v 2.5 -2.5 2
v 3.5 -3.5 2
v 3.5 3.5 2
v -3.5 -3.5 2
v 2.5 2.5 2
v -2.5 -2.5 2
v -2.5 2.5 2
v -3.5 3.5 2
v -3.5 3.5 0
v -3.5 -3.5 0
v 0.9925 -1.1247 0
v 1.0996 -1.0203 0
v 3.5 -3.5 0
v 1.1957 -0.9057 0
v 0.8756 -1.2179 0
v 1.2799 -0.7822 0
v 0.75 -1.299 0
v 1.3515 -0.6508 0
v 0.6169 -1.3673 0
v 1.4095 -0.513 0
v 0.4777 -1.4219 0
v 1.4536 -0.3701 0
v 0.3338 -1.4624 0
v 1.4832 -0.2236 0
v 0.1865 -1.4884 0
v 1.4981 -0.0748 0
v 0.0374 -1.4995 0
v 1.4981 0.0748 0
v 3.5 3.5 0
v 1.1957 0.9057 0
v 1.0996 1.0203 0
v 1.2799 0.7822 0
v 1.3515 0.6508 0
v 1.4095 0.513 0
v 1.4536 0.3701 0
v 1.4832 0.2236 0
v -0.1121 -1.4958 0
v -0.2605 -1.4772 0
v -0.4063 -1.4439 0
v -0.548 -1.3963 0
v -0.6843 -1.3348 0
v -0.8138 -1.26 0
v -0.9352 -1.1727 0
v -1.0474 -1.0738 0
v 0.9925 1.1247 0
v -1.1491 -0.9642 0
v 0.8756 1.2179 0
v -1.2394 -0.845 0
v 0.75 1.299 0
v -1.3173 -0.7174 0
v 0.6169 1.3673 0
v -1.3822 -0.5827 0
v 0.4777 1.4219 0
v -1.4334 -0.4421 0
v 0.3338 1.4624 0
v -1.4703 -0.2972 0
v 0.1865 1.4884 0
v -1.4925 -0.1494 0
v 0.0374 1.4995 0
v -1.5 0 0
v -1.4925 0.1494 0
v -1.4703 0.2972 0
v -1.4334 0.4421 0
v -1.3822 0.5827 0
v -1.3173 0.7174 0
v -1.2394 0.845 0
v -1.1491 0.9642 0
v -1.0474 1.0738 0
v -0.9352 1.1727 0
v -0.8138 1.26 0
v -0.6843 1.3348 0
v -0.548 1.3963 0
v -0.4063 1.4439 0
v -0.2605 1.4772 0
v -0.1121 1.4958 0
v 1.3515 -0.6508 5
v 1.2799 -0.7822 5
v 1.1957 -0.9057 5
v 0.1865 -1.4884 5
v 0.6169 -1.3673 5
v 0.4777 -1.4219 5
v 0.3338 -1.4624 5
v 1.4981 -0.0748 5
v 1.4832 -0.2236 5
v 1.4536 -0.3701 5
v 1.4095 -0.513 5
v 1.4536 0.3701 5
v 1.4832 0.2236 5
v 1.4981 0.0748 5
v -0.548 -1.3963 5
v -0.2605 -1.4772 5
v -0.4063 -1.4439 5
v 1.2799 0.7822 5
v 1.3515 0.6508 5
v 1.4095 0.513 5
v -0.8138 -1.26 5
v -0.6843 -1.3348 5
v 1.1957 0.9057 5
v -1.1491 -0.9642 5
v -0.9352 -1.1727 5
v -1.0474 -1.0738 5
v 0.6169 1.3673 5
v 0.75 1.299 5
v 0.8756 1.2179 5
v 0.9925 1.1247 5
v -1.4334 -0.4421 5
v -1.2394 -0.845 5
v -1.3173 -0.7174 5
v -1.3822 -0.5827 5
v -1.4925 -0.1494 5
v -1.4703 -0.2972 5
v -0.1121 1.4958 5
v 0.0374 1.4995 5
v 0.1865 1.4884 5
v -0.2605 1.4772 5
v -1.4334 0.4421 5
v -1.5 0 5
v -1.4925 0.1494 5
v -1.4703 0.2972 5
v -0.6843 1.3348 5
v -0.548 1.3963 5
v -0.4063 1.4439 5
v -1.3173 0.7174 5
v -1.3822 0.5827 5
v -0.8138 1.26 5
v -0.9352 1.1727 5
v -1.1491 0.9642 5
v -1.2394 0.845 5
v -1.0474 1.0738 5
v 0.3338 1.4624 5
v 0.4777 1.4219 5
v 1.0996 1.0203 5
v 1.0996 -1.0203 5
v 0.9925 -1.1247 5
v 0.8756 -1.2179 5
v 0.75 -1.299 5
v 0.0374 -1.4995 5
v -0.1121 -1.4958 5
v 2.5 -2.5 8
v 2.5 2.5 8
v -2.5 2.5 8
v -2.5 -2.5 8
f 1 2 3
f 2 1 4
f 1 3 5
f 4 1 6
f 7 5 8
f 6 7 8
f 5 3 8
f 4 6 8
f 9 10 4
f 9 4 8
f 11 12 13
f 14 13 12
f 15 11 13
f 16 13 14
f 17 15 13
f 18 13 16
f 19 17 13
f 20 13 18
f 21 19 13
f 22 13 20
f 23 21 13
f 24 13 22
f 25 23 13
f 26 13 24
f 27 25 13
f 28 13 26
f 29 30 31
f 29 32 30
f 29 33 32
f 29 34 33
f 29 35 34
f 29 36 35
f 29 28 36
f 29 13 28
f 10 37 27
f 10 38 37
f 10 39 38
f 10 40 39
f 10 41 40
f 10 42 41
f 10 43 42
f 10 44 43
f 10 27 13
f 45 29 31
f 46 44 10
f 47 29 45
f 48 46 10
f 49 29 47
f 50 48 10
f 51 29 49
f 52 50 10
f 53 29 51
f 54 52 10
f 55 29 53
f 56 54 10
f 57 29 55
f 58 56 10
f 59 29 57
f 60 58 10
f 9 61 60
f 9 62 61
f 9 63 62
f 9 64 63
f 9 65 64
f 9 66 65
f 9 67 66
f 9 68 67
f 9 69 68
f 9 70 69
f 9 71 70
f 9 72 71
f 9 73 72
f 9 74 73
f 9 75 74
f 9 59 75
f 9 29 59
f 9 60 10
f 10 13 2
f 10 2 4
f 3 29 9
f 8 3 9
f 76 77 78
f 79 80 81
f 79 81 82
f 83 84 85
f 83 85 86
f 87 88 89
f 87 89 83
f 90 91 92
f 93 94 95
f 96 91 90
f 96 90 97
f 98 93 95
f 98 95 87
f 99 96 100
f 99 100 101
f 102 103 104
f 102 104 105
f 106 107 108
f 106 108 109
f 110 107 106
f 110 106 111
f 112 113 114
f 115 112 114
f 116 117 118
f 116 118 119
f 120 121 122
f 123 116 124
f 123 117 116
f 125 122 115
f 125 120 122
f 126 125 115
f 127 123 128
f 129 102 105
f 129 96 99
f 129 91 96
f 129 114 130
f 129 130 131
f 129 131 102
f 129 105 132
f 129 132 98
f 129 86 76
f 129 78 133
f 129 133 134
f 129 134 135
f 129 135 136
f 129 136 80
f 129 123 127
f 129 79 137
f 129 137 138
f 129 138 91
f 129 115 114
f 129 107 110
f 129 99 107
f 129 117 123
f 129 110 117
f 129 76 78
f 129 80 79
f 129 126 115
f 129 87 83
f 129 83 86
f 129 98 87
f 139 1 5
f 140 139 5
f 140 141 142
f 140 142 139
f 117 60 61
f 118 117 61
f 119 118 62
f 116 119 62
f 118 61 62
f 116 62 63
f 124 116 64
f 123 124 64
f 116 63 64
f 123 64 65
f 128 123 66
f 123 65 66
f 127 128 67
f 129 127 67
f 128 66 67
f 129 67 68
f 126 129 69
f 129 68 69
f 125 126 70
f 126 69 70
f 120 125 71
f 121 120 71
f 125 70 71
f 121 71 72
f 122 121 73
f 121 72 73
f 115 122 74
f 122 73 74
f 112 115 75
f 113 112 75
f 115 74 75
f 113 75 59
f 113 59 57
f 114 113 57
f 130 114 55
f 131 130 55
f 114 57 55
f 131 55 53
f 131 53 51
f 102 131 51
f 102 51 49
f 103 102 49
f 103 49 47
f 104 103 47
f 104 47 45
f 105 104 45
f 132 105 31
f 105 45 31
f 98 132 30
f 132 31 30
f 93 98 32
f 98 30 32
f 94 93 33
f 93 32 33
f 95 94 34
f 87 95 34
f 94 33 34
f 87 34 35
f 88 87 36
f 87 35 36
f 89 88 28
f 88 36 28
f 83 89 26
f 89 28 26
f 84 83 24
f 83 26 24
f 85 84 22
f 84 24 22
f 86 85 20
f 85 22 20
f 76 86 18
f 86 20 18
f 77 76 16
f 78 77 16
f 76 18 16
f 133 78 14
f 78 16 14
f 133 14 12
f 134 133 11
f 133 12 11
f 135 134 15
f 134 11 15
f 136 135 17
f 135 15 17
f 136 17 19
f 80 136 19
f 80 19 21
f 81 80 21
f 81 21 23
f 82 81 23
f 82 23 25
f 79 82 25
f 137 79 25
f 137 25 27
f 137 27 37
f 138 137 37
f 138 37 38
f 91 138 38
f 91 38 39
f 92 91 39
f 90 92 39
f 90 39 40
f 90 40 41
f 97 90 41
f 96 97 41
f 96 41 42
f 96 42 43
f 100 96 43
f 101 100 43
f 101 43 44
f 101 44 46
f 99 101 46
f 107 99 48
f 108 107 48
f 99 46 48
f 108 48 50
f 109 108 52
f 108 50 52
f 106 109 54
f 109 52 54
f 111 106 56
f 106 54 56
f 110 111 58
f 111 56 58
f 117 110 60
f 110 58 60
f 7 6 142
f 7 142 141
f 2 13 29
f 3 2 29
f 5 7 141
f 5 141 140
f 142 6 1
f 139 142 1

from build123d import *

# Parameters (mm, degrees)
SKETCH_1_W          = 5
SKETCH_1_H          = 5
EXTRUDE_1_DEPTH     = 8
SKETCH_2_W          = 7
SKETCH_2_H          = 7
EXTRUDE_2_DEPTH     = 2
SKETCH_3_R          = 1.5
CUT_EXTRUDE_1_DEPTH = 5


with BuildPart() as part:
    # 草图1 → 凸台-拉伸1 (new body)
    with BuildSketch(Plane.XY):
        Rectangle(SKETCH_1_W, SKETCH_1_H)
    extrude(amount=EXTRUDE_1_DEPTH)

    # 草图2 → 凸台-拉伸2 (add)
    with BuildSketch(Plane(origin=(0, 0, 0), x_dir=(-1, 0, 0), z_dir=(0, 0, -1))):
        Rectangle(SKETCH_2_W, SKETCH_2_H)
    extrude(amount=-EXTRUDE_2_DEPTH)

    # 草图3 → 切除-拉伸1 (cut)
    with BuildSketch(Plane(origin=(0, 0, 0), x_dir=(-1, 0, 0), z_dir=(0, 0, -1))):
        Circle(SKETCH_3_R)
    extrude(amount=-CUT_EXTRUDE_1_DEPTH, mode=Mode.SUBTRACT)


solid = part.part
